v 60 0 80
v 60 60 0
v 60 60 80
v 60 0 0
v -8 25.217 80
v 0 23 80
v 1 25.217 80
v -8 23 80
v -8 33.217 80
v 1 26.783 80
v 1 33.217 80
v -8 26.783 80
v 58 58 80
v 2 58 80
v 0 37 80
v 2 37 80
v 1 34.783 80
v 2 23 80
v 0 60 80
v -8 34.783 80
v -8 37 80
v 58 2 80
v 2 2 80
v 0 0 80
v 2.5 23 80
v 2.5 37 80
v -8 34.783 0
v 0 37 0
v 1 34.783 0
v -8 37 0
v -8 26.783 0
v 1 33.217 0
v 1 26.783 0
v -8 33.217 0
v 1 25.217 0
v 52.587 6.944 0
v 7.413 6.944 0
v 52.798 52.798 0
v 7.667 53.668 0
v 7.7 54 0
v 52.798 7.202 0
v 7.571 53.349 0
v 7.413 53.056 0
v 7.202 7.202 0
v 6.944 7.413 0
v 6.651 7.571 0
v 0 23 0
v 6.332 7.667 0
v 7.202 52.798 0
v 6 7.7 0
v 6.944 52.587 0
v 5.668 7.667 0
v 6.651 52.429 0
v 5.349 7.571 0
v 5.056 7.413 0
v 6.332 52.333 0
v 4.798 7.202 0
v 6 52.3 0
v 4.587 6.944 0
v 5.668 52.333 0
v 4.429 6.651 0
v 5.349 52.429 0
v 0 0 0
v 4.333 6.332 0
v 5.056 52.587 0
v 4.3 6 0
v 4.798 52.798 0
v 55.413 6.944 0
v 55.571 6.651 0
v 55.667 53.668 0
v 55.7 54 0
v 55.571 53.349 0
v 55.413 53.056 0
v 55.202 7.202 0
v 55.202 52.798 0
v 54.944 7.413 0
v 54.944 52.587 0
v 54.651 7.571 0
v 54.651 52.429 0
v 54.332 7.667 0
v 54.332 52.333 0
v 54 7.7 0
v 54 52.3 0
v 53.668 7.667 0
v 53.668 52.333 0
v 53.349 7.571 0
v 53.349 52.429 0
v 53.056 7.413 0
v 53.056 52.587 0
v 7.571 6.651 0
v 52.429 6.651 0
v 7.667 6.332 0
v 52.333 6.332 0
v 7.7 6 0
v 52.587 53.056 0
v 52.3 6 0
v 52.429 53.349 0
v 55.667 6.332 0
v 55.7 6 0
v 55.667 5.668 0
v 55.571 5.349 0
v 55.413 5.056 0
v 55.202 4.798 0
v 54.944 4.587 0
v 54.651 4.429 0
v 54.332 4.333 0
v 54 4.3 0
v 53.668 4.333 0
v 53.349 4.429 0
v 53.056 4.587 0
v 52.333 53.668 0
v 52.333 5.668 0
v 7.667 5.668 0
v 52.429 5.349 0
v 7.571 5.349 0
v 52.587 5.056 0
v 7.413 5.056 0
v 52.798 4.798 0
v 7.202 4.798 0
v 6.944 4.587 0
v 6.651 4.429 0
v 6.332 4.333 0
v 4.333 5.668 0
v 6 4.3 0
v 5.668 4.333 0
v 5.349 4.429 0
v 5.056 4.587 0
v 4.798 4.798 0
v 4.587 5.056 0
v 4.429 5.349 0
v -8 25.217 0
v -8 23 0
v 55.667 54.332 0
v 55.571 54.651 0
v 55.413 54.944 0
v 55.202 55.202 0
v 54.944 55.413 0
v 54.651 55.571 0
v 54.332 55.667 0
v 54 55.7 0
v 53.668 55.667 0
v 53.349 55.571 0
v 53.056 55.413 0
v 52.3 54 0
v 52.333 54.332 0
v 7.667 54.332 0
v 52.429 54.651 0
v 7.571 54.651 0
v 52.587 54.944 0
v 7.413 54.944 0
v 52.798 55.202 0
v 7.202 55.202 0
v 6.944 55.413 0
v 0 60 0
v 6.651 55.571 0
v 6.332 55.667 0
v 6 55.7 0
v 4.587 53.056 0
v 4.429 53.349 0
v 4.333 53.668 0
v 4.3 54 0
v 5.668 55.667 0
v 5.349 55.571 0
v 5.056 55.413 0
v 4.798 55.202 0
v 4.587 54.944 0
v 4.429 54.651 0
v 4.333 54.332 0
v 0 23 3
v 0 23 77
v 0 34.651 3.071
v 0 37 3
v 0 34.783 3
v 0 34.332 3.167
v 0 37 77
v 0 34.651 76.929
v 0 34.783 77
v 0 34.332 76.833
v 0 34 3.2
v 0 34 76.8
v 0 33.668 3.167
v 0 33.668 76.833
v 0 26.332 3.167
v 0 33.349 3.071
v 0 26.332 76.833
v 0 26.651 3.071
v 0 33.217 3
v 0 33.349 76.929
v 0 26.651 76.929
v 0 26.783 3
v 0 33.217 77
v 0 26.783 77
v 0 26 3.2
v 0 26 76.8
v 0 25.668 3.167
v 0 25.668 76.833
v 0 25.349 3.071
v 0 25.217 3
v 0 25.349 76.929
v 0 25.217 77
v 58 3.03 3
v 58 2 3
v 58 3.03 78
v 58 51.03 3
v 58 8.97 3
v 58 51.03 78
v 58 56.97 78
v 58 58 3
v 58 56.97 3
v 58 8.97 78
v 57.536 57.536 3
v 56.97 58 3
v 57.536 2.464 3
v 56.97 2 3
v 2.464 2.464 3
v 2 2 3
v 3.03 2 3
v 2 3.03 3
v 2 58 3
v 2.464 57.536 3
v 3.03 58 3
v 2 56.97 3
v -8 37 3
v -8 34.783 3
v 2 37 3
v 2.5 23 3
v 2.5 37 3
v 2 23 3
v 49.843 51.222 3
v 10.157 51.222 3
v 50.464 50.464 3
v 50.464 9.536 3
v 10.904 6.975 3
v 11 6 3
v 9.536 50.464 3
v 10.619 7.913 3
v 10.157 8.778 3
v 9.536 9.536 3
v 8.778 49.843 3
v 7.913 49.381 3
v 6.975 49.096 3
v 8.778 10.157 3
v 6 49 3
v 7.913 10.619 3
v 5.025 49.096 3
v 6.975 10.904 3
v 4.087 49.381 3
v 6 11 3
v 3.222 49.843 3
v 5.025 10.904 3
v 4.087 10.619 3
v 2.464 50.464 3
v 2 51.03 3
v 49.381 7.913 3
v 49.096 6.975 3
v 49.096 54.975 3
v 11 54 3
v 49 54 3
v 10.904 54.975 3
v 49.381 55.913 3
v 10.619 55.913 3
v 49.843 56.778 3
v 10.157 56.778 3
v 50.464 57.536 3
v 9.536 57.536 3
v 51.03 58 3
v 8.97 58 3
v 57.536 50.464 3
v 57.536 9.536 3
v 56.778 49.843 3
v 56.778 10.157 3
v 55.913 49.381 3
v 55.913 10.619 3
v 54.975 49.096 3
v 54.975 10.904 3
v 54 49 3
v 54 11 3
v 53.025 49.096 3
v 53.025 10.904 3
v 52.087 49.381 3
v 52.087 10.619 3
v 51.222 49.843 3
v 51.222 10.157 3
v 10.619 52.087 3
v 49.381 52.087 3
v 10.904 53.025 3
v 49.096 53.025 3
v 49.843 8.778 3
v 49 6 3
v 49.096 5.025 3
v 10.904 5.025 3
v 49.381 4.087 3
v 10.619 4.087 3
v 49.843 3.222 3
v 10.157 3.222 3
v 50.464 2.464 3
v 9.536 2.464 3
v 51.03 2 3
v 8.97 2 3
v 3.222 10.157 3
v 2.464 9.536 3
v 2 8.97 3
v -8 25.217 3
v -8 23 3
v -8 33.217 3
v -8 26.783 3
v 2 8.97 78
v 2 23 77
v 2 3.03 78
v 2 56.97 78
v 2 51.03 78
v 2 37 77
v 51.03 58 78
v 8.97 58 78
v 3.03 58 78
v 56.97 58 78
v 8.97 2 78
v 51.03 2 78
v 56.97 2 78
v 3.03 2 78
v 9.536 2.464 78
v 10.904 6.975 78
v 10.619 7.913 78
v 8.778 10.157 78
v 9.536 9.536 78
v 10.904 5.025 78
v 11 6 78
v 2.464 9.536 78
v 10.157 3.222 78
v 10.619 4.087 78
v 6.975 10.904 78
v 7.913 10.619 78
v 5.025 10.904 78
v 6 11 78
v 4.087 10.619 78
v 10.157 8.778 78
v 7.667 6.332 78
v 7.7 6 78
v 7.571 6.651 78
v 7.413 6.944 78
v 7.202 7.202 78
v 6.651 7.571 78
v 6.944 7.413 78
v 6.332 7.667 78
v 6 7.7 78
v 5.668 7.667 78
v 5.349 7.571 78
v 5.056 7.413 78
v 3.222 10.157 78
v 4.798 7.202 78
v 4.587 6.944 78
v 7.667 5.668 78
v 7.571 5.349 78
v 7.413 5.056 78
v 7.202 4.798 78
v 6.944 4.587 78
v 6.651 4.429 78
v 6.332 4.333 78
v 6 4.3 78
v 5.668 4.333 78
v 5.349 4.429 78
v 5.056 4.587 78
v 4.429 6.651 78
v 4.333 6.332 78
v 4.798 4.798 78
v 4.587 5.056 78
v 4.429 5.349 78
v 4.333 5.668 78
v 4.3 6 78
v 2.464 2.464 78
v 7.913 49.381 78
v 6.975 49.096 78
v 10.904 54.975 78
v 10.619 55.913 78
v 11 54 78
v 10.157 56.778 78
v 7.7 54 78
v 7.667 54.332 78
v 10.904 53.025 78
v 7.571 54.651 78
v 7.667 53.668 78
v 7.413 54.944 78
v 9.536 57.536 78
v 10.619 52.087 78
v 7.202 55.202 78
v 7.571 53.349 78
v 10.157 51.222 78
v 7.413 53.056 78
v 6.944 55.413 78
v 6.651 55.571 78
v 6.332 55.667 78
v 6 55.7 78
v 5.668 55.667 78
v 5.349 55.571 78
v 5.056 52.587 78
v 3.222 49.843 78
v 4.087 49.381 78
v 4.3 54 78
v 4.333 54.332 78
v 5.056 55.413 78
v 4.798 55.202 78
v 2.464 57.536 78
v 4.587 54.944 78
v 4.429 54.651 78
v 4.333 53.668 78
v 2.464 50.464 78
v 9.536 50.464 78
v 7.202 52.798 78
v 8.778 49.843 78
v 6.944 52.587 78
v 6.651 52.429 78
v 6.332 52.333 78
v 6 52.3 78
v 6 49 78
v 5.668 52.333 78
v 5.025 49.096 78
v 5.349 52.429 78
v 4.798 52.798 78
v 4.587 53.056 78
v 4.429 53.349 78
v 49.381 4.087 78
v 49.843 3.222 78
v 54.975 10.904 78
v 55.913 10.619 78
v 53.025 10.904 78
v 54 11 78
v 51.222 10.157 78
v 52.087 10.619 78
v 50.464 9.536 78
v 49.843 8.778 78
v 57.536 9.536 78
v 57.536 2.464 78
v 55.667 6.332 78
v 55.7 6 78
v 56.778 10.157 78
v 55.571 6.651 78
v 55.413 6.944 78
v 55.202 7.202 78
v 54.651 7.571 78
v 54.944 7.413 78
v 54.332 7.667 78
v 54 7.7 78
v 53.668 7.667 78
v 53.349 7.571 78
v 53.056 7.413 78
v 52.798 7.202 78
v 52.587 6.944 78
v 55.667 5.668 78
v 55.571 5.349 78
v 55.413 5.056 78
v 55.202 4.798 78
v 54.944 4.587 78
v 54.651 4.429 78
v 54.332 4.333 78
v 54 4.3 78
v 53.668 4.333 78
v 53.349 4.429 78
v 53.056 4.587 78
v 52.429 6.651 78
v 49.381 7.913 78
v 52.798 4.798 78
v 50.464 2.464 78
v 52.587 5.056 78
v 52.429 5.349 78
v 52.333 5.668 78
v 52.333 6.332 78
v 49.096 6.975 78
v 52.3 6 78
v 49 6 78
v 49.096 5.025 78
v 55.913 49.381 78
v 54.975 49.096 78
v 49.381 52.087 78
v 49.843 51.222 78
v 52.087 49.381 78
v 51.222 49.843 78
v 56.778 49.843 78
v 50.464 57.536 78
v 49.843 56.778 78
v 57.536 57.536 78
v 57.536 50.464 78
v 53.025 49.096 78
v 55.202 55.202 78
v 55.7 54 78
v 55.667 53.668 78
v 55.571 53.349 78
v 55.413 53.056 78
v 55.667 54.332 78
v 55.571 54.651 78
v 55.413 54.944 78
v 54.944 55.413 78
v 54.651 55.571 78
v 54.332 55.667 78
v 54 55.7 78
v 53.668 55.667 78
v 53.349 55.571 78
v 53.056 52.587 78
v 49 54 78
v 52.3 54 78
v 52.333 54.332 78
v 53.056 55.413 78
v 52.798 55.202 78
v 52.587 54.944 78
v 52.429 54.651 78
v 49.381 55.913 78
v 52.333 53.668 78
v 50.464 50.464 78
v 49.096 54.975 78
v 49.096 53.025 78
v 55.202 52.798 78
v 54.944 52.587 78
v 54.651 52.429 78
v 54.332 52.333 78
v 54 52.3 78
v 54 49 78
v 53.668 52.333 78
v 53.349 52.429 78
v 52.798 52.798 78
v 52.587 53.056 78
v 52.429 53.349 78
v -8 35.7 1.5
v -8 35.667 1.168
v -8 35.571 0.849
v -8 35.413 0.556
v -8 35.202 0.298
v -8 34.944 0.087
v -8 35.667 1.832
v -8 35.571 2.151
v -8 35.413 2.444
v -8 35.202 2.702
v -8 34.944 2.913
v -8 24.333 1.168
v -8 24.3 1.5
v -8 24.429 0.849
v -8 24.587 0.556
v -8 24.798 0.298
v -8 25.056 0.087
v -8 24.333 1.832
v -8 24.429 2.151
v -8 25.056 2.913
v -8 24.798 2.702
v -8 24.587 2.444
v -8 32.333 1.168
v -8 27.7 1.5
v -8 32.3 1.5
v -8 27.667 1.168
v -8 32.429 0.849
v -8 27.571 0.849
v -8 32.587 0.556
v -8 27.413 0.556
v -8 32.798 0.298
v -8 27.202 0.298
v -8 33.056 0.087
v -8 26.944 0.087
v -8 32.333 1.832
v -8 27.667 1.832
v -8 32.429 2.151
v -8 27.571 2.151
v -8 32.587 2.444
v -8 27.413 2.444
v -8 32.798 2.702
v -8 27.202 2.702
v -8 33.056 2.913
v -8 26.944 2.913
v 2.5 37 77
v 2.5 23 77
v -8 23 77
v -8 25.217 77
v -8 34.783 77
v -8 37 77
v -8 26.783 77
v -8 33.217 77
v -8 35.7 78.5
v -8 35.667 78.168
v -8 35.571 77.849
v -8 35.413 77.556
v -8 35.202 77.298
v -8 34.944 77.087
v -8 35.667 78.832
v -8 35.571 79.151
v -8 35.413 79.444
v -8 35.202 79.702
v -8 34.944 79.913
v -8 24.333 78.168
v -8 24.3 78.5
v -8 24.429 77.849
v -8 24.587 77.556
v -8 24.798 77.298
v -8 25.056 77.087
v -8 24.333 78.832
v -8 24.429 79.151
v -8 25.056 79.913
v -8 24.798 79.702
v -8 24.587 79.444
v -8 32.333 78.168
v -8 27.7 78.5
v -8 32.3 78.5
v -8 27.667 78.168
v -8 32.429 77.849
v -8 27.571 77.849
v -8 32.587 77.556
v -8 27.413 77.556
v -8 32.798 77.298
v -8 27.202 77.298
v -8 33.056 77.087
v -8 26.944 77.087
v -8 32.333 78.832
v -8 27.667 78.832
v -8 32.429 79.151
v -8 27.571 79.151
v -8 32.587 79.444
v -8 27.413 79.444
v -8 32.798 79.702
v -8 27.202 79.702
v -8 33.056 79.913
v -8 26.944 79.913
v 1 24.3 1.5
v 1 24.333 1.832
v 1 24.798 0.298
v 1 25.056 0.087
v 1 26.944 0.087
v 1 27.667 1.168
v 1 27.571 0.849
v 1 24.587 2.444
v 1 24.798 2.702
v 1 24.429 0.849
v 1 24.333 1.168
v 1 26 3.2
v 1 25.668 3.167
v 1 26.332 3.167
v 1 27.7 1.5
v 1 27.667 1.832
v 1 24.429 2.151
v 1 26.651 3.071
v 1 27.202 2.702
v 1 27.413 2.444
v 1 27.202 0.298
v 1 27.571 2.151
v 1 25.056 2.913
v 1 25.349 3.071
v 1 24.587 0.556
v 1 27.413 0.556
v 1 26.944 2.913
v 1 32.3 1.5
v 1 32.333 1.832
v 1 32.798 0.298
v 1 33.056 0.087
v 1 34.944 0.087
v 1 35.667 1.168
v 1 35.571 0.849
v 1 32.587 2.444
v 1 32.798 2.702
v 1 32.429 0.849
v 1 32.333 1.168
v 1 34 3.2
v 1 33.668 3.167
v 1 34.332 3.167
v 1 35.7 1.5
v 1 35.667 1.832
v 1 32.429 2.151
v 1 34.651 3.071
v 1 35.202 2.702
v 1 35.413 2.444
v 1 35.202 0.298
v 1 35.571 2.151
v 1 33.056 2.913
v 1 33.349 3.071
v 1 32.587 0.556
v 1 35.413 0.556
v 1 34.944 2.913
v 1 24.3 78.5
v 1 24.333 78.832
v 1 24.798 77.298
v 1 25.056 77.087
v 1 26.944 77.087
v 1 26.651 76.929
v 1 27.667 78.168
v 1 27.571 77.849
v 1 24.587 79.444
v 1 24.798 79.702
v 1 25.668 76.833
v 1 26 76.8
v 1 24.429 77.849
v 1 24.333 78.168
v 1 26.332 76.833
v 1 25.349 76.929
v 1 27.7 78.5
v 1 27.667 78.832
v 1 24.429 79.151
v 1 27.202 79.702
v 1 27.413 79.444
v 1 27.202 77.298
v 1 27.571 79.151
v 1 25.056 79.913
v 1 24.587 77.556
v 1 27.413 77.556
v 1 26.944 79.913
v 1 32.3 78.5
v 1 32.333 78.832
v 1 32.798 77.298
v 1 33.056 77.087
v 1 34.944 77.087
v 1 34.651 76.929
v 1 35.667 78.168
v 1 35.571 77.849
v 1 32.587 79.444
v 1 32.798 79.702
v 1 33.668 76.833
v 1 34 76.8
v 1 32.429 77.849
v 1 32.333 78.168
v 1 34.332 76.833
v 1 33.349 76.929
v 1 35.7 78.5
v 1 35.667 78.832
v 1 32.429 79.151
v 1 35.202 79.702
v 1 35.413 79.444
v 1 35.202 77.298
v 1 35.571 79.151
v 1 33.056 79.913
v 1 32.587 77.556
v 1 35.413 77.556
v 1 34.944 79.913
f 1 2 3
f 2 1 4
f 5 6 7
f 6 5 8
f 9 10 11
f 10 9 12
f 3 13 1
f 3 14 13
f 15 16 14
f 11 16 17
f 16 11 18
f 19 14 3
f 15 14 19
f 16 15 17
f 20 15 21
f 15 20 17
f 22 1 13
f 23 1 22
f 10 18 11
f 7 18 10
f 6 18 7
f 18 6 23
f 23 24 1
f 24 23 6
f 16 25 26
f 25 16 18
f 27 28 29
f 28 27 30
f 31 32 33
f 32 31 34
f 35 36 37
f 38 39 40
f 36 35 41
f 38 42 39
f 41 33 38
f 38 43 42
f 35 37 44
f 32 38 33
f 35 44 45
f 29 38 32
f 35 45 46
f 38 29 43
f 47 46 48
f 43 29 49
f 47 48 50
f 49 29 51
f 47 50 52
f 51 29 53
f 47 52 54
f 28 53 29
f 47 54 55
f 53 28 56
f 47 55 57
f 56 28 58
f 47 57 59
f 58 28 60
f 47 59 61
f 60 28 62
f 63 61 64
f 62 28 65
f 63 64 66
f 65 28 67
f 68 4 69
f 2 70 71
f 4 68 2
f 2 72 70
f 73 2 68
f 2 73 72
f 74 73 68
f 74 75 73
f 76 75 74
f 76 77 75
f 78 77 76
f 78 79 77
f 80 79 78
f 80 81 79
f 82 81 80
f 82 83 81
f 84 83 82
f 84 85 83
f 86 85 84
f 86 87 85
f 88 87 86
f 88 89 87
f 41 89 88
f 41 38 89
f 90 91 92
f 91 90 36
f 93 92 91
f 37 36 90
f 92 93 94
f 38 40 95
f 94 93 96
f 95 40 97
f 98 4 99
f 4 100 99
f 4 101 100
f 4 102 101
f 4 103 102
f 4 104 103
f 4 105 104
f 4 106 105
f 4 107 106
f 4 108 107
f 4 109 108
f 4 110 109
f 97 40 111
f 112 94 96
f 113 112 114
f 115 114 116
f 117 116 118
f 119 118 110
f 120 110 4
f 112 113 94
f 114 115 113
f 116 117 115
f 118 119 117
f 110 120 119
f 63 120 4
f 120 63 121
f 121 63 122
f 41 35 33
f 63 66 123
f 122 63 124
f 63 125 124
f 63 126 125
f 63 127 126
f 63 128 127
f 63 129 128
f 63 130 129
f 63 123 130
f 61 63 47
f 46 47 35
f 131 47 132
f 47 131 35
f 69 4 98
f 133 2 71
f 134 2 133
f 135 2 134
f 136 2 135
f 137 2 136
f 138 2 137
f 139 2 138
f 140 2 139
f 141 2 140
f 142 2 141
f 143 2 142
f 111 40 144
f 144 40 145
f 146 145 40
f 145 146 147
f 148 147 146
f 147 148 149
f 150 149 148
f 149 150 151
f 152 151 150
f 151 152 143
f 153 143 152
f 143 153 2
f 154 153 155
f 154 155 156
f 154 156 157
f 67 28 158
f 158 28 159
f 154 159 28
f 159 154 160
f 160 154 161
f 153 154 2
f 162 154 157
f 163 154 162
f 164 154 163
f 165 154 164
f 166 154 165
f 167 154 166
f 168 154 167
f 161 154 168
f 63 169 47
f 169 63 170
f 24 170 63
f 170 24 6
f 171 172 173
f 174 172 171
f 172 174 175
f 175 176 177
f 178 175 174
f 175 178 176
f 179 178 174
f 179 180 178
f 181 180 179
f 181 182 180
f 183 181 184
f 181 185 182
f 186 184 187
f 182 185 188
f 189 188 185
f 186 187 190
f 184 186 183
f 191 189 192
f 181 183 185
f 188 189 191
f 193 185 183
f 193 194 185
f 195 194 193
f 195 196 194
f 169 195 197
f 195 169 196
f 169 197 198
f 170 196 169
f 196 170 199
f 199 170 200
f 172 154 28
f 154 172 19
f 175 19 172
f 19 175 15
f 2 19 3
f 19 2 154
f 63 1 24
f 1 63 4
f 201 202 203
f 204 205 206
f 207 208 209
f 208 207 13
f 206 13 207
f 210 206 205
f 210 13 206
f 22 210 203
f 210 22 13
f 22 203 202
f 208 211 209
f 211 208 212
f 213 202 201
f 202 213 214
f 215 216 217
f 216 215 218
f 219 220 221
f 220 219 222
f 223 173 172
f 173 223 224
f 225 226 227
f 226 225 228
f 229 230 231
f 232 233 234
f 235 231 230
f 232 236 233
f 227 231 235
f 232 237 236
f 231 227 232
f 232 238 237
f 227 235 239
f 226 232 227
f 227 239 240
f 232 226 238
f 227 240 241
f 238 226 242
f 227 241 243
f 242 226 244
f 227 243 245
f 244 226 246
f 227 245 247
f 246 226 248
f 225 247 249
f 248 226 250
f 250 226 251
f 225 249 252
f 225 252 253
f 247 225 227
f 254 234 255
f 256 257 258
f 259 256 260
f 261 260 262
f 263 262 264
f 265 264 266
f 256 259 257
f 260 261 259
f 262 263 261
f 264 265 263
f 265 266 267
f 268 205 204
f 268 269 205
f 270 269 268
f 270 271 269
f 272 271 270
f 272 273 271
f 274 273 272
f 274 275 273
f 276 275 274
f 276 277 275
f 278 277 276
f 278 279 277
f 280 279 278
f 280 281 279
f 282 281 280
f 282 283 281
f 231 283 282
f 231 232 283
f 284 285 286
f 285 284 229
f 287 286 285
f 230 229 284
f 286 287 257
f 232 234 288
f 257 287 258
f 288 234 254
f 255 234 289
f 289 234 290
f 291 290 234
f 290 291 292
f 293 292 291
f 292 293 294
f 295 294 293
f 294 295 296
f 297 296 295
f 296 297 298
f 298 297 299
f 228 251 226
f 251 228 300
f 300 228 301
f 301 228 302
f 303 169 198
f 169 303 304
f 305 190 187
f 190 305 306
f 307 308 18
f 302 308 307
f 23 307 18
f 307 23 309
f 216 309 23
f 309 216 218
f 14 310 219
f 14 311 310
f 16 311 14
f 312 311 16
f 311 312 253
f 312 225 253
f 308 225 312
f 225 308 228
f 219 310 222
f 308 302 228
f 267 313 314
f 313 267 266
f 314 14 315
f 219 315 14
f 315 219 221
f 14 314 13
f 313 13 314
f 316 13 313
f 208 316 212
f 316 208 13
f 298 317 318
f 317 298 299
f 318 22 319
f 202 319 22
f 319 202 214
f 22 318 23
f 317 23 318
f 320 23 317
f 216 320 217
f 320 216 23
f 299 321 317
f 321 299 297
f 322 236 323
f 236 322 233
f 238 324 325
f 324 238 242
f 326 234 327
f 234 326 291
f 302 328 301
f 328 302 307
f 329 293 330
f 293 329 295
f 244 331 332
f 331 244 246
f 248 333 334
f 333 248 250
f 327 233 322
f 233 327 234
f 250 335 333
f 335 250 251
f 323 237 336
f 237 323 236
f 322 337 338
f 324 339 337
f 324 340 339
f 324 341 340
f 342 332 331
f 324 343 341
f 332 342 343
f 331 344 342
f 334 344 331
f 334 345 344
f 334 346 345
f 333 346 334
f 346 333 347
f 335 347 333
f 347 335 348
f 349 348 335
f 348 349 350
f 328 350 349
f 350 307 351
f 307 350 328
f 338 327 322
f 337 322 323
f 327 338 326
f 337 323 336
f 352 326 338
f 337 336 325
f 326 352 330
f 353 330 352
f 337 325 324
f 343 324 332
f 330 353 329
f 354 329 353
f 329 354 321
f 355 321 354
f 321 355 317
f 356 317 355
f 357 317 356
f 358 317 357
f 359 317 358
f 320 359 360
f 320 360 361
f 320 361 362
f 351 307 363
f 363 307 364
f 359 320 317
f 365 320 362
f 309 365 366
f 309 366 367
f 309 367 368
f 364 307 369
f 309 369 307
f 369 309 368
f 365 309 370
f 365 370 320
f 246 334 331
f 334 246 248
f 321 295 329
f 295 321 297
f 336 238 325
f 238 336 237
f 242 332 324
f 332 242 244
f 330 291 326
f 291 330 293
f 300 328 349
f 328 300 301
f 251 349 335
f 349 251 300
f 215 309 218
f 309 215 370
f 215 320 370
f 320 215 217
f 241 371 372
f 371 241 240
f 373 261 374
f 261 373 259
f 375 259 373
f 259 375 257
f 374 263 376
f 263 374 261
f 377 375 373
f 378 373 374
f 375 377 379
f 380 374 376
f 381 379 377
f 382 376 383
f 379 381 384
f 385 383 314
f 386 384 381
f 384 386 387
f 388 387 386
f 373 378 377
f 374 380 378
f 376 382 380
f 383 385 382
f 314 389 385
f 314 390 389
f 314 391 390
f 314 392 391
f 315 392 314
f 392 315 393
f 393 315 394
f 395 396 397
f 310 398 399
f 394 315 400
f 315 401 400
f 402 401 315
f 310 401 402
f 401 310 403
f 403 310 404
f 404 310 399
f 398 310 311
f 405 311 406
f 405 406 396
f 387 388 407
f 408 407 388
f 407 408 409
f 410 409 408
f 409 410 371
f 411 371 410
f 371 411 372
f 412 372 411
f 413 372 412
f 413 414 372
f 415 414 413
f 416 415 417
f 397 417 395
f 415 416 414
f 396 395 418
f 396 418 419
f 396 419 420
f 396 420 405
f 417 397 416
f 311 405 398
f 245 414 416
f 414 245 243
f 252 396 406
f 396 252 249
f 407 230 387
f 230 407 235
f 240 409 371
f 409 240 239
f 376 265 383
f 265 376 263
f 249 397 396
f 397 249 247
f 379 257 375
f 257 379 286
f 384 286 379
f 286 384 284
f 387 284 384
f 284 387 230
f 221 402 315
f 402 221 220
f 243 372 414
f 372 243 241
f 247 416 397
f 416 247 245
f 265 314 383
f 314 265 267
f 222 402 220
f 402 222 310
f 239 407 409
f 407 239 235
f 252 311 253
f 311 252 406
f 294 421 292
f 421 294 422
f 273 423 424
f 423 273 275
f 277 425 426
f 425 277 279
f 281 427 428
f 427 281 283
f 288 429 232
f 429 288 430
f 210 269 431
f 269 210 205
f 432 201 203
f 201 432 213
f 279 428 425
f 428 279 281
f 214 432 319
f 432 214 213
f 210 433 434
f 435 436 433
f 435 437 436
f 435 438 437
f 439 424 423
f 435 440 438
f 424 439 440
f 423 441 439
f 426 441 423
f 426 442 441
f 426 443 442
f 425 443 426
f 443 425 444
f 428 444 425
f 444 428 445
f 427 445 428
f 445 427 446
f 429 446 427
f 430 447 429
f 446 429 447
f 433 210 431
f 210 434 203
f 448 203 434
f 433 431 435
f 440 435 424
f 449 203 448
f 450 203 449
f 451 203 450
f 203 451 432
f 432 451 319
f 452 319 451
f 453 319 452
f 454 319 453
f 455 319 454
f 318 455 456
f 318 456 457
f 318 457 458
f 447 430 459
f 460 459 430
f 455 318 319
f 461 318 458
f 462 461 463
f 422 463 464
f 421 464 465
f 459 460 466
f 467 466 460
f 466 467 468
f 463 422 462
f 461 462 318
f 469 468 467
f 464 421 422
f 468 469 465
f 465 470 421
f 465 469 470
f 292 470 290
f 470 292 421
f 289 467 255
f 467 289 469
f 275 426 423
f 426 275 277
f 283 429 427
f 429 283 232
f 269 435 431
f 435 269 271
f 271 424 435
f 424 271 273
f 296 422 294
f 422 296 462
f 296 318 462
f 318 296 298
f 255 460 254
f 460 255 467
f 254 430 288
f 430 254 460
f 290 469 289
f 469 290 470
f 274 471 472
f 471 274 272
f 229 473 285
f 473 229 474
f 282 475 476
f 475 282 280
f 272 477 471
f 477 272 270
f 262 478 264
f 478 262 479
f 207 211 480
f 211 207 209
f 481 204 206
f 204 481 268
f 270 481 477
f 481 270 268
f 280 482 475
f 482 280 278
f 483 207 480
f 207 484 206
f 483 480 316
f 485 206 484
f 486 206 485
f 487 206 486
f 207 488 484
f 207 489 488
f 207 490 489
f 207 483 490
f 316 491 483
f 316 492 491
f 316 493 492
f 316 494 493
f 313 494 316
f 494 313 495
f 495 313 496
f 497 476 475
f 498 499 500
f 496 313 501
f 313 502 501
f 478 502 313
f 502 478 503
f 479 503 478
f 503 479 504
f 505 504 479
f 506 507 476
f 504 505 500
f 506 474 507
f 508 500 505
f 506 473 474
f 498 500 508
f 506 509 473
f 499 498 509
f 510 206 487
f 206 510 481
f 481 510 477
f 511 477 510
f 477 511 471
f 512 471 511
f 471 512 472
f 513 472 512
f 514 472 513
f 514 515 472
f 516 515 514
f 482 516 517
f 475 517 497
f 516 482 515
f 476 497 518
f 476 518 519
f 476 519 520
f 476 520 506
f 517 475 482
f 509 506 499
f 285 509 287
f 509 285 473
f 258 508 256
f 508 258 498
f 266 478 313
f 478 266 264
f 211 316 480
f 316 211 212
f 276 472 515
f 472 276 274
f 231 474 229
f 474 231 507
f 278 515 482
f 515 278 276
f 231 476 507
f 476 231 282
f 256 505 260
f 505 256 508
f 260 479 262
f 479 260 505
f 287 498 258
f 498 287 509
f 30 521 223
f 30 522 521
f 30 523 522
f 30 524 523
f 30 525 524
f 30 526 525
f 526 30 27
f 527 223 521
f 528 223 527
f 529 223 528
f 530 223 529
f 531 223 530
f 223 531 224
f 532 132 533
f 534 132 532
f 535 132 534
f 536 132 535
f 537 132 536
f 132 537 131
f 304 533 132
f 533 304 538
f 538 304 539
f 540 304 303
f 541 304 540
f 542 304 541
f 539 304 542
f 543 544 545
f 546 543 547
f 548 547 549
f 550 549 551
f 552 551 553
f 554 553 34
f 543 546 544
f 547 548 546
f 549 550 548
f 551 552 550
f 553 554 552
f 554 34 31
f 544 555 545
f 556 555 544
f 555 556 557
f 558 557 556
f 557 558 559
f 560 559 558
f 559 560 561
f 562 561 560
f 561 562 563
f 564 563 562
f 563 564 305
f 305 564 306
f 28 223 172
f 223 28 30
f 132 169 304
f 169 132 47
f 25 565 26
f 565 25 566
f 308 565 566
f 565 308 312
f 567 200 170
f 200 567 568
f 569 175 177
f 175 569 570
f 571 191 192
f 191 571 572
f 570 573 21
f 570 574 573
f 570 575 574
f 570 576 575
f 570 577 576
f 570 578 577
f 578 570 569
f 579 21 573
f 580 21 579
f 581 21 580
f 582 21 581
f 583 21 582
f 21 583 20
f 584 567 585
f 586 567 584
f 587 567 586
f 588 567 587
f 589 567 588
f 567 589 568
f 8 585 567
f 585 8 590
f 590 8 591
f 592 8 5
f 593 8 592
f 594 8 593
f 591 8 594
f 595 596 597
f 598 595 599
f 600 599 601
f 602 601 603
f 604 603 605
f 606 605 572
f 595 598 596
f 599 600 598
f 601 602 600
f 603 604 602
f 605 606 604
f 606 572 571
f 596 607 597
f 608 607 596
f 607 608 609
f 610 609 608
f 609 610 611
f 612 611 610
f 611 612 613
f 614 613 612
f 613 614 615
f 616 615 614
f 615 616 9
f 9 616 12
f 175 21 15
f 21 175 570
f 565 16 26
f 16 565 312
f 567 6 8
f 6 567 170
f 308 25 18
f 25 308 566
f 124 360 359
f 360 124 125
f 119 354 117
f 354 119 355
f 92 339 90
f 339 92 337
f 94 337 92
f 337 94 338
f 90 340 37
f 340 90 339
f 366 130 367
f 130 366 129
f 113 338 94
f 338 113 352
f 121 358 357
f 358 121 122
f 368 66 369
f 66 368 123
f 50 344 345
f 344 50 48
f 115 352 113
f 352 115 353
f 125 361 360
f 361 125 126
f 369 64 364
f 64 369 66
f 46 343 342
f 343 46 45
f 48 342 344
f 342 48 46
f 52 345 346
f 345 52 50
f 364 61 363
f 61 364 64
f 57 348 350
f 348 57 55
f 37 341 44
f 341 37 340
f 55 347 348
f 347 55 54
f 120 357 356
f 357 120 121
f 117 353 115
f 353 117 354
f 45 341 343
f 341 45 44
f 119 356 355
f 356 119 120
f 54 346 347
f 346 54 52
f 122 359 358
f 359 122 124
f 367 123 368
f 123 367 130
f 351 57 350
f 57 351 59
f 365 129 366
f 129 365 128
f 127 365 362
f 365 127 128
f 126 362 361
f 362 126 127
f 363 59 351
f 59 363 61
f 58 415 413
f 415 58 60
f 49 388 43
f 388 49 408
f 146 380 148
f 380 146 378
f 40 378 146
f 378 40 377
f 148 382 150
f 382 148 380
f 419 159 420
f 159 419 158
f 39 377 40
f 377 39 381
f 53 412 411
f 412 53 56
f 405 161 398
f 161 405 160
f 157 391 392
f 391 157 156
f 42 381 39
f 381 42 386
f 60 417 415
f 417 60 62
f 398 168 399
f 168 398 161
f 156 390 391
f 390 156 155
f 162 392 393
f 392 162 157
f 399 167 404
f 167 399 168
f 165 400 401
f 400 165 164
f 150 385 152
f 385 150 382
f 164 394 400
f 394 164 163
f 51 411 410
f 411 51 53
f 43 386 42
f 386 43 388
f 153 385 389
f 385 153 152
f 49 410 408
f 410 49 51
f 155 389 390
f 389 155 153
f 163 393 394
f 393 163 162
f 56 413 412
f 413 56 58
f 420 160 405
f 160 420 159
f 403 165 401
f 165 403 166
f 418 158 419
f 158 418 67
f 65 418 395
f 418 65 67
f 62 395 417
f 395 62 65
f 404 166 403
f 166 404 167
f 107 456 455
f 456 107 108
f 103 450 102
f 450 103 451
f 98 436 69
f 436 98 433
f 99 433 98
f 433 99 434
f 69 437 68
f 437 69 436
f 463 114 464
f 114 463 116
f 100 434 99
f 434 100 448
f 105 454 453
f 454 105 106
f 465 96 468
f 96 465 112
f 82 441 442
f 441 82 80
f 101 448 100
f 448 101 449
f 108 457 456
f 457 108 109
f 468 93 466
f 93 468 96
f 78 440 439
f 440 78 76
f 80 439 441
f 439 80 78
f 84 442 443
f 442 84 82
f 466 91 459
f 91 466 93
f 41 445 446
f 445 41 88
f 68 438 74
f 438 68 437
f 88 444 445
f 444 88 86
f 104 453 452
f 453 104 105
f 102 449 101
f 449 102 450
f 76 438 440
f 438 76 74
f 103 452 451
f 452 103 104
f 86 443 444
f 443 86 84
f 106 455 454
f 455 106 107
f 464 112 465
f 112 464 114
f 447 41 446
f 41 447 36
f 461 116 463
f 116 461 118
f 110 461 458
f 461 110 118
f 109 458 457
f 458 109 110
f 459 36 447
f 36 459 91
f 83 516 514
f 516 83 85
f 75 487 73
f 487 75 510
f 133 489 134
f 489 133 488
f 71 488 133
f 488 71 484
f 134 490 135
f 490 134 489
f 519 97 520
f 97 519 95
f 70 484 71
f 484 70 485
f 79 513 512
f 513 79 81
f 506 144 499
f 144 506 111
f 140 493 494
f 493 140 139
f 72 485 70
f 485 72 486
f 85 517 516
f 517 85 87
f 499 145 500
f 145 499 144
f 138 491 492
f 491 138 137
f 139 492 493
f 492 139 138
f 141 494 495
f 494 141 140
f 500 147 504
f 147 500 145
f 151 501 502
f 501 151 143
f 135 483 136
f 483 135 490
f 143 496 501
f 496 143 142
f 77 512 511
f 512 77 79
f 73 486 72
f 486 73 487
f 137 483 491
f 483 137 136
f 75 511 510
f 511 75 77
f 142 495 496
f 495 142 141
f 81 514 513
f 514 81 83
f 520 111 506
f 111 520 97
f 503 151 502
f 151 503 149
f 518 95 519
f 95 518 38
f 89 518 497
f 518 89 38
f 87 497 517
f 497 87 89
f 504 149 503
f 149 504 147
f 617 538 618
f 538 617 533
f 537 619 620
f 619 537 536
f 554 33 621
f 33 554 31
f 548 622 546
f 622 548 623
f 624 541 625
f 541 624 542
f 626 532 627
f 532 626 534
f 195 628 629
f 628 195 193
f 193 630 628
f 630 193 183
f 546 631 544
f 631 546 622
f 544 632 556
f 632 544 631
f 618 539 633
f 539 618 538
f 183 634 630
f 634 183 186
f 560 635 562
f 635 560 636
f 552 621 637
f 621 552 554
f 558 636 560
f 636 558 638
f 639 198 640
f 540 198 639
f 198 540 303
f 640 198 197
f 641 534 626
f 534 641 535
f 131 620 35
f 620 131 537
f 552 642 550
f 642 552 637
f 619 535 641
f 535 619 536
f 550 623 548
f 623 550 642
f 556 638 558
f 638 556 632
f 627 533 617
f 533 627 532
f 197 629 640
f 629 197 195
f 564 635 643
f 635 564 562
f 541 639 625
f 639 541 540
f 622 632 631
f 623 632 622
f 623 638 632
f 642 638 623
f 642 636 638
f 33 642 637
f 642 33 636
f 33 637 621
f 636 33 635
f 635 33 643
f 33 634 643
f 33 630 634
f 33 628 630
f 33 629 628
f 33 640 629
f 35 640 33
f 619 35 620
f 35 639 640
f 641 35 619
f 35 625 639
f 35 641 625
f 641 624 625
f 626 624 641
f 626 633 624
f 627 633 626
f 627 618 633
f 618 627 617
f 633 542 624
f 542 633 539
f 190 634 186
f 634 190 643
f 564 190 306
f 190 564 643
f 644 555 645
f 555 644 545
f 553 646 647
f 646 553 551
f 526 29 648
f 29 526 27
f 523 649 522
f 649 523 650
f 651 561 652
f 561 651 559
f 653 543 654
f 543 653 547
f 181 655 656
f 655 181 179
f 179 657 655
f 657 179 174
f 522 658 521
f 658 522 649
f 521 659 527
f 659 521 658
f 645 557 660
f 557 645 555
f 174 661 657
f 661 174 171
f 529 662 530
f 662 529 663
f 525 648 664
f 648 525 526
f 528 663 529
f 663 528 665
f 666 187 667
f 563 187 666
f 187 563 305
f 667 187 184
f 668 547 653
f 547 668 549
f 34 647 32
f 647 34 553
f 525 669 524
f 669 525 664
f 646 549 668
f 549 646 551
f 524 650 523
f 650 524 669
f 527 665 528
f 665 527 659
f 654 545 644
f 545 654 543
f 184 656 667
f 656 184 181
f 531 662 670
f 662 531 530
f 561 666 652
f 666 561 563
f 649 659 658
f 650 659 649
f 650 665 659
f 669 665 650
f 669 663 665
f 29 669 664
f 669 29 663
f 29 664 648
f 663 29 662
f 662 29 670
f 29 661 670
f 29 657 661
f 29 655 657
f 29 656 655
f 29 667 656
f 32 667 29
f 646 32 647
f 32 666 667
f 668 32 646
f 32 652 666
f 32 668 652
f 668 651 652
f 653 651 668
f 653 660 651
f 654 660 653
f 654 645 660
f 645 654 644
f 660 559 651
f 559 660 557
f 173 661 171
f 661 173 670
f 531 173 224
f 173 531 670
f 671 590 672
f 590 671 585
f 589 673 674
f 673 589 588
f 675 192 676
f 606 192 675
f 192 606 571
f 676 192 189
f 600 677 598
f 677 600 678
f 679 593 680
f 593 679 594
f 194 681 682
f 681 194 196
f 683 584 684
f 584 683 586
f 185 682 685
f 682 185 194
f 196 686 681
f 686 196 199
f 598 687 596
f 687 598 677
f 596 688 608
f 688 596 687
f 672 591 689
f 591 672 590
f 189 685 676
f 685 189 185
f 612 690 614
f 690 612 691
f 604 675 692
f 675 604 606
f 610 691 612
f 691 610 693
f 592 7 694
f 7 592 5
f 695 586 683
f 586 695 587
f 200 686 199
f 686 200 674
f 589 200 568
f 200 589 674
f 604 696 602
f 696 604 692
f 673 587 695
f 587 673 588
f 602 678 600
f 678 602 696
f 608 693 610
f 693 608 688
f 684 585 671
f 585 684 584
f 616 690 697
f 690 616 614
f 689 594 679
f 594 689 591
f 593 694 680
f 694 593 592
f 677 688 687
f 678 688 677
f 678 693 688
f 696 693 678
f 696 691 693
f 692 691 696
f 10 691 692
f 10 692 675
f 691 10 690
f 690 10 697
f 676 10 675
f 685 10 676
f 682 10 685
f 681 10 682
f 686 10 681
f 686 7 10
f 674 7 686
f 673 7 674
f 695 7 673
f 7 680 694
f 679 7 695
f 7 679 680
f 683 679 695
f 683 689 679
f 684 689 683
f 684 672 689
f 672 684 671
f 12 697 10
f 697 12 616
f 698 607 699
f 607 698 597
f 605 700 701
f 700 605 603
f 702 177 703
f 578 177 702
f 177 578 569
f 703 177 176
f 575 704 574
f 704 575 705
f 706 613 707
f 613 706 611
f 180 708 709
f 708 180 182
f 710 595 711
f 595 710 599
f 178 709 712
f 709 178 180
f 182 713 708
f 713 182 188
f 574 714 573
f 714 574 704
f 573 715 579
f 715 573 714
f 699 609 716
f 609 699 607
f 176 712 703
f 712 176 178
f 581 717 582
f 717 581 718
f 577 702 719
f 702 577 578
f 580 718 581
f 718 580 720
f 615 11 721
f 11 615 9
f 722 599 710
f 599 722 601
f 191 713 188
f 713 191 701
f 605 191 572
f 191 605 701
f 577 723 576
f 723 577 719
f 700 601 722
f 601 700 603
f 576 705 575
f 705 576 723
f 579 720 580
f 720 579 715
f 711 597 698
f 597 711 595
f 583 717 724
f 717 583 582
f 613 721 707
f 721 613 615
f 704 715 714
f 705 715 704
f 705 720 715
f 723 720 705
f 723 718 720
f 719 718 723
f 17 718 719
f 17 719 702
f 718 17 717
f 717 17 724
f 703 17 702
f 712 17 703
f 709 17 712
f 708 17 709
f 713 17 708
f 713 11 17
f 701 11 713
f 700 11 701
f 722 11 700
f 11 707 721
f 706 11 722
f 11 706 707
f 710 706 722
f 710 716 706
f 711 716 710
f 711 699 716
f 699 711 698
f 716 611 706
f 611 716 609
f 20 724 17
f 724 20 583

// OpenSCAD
$fn = 32;

// ----------------------------------------------------------------------
// Enclosure body: 60 x 60 x 80 mm, wall 2 mm
// ----------------------------------------------------------------------

// --- parameters (mm) ---
length = 60;              // outside length, X
width = 60;               // outside width, Y
height = 80;              // outside height, Z
wall = 2;                 // side wall thickness
floor_t = 3;              // floor thickness
boss_d = 10;              // corner boss diameter
boss_h = 75;              // corner boss height above the floor
boss_hole_d = 3.4;        // lid screw clearance in the boss
boss_lip = 6;             // boss centre inset from the corner
ear_w = 14;               // mounting ear width
ear_t = 3;                // mounting ear thickness
ear_ext = 8;              // mounting ear reach
ear_hole_d = 3.4;         // mounting ear drills

module shell() {
  difference() {
    cube([length, width, height]);
    /* hollow, open at the top */
    translate([wall, wall, floor_t])
      cube([length - 2 * wall, width - 2 * wall, height]);
  }
}

module bosses() {
  /* corner bosses, sunk 1 mm into the floor */
  for (sx = [0, 1]) for (sy = [0, 1])
    translate([sx * (length - 2 * boss_lip) + boss_lip, sy * (width - 2 * boss_lip) + boss_lip, floor_t - 1])
      cylinder(h = boss_h + 1, d = boss_d);
}

module ears() {
  /* mounting ears on the short walls, sunk into the wall */
  for (sz = [0, 1])
    translate([-ear_ext, width / 2 - ear_w / 2, sz * (height - ear_t)])
      cube([ear_ext + 2.5, ear_w, ear_t]);
}

difference() {
  union() {
    shell();
    bosses();
    ears();
  }
  /* boss screw holes */
  for (sx = [0, 1]) for (sy = [0, 1])
    translate([sx * (length - 2 * boss_lip) + boss_lip, sy * (width - 2 * boss_lip) + boss_lip, -1]) cylinder(h = floor_t + boss_h + 2, d = boss_hole_d);
  for (sz = [0, 1]) for (sx = [0, 1]) translate([-ear_ext - 1, width / 2 + (2 * sx - 1) * (ear_w / 2 - 3), sz * (height - ear_t) + ear_t / 2]) rotate([0, 90, 0]) cylinder(h = ear_ext + 2, d = ear_hole_d);
}
